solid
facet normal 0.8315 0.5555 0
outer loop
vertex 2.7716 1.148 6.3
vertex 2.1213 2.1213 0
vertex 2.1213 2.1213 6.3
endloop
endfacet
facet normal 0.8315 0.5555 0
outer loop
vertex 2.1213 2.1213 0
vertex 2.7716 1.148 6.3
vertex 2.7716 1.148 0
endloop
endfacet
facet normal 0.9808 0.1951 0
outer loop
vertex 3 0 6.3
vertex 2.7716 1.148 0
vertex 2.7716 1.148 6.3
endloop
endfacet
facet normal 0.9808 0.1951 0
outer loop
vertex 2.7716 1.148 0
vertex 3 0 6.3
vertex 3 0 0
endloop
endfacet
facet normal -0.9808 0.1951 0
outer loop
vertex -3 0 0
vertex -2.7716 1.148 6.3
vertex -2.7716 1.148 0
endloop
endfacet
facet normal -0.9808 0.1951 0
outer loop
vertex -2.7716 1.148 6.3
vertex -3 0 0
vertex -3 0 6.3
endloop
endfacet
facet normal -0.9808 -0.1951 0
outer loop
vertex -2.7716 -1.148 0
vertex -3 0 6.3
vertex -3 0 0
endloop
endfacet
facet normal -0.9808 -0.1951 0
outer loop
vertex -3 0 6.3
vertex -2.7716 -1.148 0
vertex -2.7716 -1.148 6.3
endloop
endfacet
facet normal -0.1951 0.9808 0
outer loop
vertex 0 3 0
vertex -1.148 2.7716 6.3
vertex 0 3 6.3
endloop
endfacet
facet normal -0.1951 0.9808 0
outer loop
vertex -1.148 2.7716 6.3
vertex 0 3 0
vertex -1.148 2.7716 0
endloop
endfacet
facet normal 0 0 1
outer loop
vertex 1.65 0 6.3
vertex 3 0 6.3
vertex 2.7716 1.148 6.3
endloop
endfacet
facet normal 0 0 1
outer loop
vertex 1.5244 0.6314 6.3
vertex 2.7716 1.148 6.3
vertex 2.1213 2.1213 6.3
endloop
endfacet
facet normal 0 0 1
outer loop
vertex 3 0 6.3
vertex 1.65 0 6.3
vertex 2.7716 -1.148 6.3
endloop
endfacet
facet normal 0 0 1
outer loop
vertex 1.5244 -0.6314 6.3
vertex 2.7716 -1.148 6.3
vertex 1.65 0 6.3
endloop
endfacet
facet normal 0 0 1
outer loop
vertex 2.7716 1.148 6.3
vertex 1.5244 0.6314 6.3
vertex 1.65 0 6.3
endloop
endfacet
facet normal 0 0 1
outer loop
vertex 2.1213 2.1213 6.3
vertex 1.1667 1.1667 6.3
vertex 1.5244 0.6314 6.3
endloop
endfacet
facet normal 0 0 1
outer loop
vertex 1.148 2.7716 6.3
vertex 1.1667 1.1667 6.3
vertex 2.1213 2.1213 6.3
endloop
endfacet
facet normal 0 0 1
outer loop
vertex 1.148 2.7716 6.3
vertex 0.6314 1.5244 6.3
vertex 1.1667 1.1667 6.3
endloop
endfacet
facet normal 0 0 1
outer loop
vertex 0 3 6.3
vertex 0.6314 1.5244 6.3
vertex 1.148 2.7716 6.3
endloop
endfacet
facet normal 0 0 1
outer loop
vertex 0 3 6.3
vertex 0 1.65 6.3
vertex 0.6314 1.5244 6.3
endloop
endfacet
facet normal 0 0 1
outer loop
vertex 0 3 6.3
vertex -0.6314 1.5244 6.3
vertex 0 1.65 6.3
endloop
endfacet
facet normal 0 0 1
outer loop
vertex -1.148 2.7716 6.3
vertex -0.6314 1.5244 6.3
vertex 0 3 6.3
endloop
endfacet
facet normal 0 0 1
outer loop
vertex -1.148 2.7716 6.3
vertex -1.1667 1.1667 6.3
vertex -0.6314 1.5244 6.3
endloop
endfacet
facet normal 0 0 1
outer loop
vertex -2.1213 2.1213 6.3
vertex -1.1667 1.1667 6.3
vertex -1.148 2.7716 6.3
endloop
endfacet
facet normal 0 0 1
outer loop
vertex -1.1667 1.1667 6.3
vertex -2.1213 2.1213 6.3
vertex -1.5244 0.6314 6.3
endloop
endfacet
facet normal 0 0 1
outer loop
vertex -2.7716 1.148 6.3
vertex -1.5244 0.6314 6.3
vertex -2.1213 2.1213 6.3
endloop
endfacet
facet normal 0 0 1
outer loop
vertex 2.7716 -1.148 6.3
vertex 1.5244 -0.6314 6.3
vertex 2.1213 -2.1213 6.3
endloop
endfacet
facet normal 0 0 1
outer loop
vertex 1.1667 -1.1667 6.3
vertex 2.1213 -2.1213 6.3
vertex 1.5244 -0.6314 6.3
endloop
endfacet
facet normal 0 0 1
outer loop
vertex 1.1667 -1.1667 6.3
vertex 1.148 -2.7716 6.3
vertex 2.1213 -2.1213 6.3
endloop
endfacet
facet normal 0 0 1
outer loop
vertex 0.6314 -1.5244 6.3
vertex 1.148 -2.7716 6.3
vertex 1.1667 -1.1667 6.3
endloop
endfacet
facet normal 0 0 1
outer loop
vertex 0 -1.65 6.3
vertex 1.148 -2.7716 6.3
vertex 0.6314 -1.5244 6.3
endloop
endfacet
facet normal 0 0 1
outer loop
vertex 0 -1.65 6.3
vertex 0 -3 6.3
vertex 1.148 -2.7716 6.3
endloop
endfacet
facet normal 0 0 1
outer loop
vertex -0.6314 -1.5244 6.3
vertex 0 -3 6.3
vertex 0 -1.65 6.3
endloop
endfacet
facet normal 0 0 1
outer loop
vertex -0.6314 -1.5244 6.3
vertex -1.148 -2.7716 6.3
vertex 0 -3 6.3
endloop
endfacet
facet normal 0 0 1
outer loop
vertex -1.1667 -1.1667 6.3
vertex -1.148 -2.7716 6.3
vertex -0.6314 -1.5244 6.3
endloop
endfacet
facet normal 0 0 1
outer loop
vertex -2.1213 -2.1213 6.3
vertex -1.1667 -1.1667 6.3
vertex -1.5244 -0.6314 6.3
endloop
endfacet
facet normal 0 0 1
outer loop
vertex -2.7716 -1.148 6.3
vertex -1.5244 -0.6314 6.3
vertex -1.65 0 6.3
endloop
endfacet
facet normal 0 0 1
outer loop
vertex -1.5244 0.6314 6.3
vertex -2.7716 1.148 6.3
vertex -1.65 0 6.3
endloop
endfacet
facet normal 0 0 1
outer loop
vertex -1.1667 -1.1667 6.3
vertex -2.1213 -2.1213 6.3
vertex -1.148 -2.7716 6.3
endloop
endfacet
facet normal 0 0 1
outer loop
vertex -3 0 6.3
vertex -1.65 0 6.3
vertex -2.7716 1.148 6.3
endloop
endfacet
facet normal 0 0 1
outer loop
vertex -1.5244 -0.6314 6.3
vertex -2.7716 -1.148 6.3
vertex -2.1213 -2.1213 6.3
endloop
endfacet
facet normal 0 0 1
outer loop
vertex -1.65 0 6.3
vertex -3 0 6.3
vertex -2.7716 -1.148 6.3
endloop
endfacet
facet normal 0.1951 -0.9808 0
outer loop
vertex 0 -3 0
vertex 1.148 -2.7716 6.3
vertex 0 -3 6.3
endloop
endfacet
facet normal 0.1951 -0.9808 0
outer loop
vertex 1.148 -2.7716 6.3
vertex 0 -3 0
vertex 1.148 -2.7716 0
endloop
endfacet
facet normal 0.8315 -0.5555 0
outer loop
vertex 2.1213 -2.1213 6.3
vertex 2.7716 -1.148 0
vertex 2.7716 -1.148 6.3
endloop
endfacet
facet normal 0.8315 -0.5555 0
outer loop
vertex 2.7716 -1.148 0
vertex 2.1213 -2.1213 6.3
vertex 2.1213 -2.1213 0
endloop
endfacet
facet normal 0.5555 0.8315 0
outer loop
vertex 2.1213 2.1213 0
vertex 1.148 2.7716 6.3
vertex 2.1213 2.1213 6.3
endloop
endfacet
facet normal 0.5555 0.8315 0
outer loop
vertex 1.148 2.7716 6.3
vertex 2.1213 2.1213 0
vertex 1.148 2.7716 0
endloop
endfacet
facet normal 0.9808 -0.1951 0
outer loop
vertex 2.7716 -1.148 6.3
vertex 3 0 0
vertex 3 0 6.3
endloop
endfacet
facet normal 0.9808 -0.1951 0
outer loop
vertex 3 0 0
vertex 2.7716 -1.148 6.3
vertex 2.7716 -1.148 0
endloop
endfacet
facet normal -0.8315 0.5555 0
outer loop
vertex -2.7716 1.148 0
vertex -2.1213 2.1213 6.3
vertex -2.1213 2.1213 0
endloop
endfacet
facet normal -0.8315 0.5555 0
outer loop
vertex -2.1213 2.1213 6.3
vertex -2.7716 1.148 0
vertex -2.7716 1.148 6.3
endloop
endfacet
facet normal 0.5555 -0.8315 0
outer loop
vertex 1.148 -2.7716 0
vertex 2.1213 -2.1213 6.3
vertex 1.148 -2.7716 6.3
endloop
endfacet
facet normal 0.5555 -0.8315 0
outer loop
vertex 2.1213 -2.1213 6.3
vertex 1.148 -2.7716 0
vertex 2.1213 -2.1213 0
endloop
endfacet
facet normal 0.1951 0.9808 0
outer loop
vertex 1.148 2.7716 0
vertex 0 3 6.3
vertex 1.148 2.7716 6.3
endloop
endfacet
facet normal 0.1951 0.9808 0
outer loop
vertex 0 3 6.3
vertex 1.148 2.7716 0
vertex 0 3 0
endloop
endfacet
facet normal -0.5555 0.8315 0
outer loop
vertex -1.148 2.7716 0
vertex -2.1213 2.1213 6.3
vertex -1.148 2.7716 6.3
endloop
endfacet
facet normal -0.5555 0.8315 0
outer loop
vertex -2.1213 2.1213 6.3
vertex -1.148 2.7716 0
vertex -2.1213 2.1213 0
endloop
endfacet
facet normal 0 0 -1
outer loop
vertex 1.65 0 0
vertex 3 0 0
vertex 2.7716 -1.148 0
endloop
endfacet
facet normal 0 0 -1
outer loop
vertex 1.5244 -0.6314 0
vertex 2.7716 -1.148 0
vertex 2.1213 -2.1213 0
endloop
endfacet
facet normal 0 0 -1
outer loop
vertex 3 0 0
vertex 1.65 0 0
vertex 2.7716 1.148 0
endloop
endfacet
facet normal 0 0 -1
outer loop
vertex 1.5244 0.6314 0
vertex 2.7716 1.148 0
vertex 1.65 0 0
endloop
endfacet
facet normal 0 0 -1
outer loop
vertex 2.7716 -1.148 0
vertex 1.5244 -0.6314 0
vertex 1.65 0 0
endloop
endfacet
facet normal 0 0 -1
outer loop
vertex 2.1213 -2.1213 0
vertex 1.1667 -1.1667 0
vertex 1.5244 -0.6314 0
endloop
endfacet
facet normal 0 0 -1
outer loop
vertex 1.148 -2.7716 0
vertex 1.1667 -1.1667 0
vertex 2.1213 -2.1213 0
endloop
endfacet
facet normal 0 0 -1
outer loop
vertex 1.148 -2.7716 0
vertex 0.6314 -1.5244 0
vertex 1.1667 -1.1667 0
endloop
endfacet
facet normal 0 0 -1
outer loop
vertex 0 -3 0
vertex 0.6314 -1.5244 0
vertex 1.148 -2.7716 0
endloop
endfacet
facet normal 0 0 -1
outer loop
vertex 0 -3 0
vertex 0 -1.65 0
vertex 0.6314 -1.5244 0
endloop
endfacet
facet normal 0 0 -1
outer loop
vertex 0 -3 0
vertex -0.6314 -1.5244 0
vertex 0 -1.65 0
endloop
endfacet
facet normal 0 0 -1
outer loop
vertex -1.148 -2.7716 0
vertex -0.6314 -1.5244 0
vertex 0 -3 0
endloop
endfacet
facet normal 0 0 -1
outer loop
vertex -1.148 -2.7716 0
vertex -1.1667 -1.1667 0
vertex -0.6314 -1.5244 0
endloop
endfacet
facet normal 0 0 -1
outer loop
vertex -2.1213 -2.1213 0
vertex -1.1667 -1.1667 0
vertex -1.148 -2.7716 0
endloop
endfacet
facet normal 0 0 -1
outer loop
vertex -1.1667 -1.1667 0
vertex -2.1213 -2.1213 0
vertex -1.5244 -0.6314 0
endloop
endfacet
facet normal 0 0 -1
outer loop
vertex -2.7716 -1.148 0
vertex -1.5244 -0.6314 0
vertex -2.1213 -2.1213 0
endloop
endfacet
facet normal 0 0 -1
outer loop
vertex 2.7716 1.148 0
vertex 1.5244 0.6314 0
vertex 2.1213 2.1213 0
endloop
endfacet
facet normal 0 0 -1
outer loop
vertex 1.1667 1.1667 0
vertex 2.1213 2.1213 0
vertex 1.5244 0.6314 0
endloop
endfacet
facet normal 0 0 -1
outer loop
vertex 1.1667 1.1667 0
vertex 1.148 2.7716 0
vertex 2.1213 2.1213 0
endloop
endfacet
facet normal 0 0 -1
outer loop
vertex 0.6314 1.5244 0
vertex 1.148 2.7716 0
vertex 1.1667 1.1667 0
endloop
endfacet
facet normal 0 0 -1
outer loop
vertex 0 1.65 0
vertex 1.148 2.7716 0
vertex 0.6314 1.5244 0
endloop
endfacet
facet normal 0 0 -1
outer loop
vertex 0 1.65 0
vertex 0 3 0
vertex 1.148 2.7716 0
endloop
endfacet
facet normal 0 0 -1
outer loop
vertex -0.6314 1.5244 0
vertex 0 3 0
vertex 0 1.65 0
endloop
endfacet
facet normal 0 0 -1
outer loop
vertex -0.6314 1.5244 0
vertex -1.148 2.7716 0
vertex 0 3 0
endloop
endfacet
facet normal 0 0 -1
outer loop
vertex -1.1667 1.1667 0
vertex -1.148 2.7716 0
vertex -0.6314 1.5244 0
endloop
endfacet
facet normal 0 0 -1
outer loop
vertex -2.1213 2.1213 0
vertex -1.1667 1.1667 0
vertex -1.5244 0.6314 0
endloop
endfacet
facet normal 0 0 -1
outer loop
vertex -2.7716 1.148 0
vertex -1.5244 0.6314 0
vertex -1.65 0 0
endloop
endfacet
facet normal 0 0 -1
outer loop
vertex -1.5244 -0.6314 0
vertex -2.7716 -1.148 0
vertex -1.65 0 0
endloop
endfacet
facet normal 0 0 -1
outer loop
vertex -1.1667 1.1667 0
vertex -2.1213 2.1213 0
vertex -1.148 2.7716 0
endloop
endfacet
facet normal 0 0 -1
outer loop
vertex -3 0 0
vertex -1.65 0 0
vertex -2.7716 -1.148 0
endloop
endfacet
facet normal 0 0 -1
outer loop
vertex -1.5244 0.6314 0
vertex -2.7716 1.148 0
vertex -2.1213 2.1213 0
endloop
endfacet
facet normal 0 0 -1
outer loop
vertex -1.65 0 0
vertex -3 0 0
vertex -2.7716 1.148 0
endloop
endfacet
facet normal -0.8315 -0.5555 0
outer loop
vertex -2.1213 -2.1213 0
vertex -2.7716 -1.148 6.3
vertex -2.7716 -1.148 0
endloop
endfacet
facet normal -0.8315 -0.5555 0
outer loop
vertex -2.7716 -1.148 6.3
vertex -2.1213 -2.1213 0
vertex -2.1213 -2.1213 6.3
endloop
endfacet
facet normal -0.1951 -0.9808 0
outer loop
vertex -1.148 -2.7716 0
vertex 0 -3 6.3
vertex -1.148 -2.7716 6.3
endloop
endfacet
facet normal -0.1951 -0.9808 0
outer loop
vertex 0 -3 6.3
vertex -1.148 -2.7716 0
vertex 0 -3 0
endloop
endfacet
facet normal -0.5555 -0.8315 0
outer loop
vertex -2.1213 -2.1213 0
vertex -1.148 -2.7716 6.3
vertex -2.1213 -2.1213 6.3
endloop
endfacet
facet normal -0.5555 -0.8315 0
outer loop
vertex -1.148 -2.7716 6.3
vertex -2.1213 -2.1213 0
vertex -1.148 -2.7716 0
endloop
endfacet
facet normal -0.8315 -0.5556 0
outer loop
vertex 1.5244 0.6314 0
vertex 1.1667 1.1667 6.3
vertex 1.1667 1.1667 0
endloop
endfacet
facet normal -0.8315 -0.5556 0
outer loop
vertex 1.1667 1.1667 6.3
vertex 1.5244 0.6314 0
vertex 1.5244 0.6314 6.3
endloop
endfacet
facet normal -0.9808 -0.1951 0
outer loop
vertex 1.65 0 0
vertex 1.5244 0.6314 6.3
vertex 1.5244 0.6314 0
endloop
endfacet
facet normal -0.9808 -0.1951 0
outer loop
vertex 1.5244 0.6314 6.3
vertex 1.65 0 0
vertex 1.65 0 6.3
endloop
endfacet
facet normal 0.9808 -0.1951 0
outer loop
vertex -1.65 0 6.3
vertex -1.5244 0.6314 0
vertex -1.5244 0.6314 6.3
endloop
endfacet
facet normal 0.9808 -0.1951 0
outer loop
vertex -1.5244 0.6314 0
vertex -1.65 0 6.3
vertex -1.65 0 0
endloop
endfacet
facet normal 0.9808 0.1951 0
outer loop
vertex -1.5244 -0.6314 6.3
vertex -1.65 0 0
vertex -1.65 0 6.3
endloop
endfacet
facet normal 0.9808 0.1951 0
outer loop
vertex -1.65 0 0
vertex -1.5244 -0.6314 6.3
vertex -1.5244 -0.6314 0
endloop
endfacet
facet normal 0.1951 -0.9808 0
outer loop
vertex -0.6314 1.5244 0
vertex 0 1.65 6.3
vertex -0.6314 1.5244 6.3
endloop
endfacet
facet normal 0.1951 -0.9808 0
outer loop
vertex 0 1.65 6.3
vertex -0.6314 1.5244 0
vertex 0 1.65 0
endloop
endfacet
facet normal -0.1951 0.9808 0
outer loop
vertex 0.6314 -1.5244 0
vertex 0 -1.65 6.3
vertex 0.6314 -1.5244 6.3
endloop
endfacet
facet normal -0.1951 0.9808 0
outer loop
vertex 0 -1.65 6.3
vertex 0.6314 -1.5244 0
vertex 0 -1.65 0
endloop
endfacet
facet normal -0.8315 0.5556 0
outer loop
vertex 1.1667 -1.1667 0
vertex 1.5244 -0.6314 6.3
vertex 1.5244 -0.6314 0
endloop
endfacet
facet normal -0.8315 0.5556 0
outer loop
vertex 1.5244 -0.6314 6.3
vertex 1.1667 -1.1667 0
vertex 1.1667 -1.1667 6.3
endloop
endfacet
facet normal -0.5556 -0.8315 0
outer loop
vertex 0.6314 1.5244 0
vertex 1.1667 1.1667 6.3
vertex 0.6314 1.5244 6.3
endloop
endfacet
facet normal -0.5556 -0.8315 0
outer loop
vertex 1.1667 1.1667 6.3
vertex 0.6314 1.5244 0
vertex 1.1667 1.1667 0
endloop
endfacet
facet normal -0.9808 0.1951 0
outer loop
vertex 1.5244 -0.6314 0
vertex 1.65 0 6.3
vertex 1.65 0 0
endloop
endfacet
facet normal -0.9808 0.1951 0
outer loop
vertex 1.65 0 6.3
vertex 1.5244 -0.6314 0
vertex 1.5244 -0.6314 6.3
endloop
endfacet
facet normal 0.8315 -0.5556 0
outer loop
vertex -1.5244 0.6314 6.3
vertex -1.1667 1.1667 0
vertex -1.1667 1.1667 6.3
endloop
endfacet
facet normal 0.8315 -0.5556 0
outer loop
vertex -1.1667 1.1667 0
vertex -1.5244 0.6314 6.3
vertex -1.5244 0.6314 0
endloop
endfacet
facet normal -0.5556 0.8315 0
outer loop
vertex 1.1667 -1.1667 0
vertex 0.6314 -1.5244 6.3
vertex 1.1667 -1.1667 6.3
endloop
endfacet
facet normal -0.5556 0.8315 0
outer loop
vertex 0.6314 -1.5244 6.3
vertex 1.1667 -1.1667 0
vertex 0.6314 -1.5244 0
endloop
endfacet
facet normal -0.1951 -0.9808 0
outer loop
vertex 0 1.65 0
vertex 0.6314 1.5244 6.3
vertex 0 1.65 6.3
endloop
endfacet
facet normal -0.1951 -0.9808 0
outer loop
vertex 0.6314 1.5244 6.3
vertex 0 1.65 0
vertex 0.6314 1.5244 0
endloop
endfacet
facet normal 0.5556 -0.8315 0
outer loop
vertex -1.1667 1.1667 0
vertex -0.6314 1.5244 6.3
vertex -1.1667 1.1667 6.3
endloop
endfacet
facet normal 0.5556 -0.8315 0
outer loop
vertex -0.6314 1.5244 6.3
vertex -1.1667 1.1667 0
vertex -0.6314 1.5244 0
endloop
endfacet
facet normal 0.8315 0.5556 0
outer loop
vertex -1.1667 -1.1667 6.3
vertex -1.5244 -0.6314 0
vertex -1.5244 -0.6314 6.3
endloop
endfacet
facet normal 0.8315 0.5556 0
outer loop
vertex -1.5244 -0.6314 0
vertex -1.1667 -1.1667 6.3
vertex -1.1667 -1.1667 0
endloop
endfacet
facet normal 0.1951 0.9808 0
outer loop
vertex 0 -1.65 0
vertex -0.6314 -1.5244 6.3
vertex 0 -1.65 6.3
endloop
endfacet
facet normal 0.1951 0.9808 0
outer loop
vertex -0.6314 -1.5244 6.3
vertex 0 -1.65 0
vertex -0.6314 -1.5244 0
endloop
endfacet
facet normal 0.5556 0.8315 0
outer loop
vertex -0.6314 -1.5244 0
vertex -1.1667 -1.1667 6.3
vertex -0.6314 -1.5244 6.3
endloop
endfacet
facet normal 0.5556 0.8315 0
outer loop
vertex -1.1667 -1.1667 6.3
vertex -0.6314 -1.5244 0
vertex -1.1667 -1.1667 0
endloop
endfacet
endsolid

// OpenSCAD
// file: parameter.scad
nStrings=6;
nFrets=22;
nLedFrets=16;
m5Dia=5.3;
m5HeadZ=3.5;
m4Dia=4.3;
m4NutDia=8.3;
m4NutZ=3.5;
m4HeadZ=2.5;
m3Dia=3.3;
m3NutDia=6.6;
m3NutZ=2.5;
m3HeadZ=2;
strDistN=8;
strDistB=10;
scale=700;
neckSlotY=500;
neckSlotX=44;
slotXY=20;
neckSlotDist=neckSlotX-slotXY*2;
bodySlotX=124;
bodySlotY=290;

jackYA=40;
jackYB=54;
jackZA=20;
jackZB=25;

bodyX=300;

strDia=[1.7,1.4,1.1,0.7,0.5,0.35];

fretLN=strDistN*(nStrings-1)+5;
fretLB=strDistB*(nStrings-1)+5;
strSpanB=strDistB*(nStrings-1);
strSpanN=strDistN*(nStrings-1);
fretBtmZ=1;

fretY=16;
fretDia=3.5;
fretZ=1.5;
fretboardZ=3.5;

L=scale;
k=1.05946;

fretPos1=scale-(scale/pow(k,4));


//echo (fretPos1);
// main file
include <parameter.scad>

spacer(6.3); //fader:8 rotary switches:9.3
//joyButton();
//button(8); //
//dispFrame();
//sixRotEnc();

module spacer(h){
    $fn=16;
    dO=6;
    dI=3.3;
    difference(){
        cylinder(d=dO,h=h);
        cylinder(d=dI,h=h);
    }
}

module joyButton(){
 
    $fn=32;
    dA=8;
    dAi=4.2;
    dAiB=3.2;
    dB=18;
    moldScale=0.3;
    moldZOff=1;
    
    zA=6;
    zAi=3.5;
    zB=2.5;
    
    difference(){
        union(){
            cylinder(d=dA,h=zA);
            translate([0,0,zA])cylinder(d=dB,h=zB);
        }
        difference(){
            cylinder(d=dAi,h=zAi);
            translate([dAi-(dAi-dAiB)/2,0,0])cube([dAi,dAi,zAi*2],center=true);
            translate([-dAi+(dAi-dAiB)/2,0,0])cube([dAi,dAi,zAi*2],center=true);
        }    
        translate([0,0,zA+zB+moldZOff])scale([1,1,moldScale])sphere(d=dB);
    }
}

module button(space){
    //space=7;
    swH=5;
    hub=1;
    $fn=32;
    dI=7.3;
    dOA=16;
    dOB=14;
    
    zI=swH-hub;
    zA=space-hub;
    zB=4;
    
    moldScale=0.3;
    moldZOff=1;
    
    difference(){
        union(){
            cylinder(d=dOA,h=zA);
            cylinder(d=dOB,h=zA+zB);
        }
        translate([0,0,zA+zB+moldZOff])scale([1,1,moldScale])sphere(d=dOB);
        cube([dI,dI,zI*2],center=true);
    }
}

module dispFrame(){
    xO=40;
    yO=35;
    
    xI=33;
    yI=28;
    
    iOffY=2;
    
    fW=4; //width of the frame
    
    hA=1.5; //height of the frame on surface
    hB=4;
    
    difference(){
        union(){
            rcube([xO+fW*2,yO+fW*2,hA],2);
            translate([0,0,hA])rcube([xO,yO,hB],2);
        }
        hull(){
            translate([0,0,0])rcube([xO,yO,0.6],2);
            translate([0,0,hA+hB-0.7])rcube([xI,yI,0.1],2);
        }
        translate([0,0,hA+hB-0.6])rcube([xI,yI,0.6],2);
    }
}

module sixRotEnc(){
    strings=6;
    spacing=70;
    screwDia=4.4;
    centY=10;
    rotD=7.5;
    y=30;
    h=2.5;
    difference(){
        translate([0,0,0])rcube([bodySlotX,y,h],3);
        translate([-spacing/2,0,0]){
            for(x=[0:strings-1]){
                translate([x*(spacing/(strings-1)),0,0]){
                    translate([0,-y/2+centY,0])cylinder(d=rotD,h=h+1);
                    //cylinder(d=screwTdia,h=tZ);
                }
            }
        }
        translate([-bodySlotX/2+slotXY/2,0,0])cylinder(d=screwDia,h=h+1);
        translate([bodySlotX/2-slotXY/2,0,0])cylinder(d=screwDia,h=h+1);
    }
}


module spacerDisp(){
}

module rcube(size,radius){
$fn=32;
linear_extrude(height=size[2])
if(radius>0){
hull()
{
    // place 4 circles in the corners, with the given radius
    translate([(-size[0]/2)+(radius), (-size[1]/2)+(radius), 0])
    circle(r=radius);

    translate([(size[0]/2)-(radius), (-size[1]/2)+(radius), 0])
    circle(r=radius);

    translate([(-size[0]/2)+(radius), (size[1]/2)-(radius), 0])
    circle(r=radius);

    translate([(size[0]/2)-(radius), (size[1]/2)-(radius), 0])
    circle(r=radius);
}
}
if(radius==0){
translate([0,0,size[2]/2])cube(size,center=true);
}
}
